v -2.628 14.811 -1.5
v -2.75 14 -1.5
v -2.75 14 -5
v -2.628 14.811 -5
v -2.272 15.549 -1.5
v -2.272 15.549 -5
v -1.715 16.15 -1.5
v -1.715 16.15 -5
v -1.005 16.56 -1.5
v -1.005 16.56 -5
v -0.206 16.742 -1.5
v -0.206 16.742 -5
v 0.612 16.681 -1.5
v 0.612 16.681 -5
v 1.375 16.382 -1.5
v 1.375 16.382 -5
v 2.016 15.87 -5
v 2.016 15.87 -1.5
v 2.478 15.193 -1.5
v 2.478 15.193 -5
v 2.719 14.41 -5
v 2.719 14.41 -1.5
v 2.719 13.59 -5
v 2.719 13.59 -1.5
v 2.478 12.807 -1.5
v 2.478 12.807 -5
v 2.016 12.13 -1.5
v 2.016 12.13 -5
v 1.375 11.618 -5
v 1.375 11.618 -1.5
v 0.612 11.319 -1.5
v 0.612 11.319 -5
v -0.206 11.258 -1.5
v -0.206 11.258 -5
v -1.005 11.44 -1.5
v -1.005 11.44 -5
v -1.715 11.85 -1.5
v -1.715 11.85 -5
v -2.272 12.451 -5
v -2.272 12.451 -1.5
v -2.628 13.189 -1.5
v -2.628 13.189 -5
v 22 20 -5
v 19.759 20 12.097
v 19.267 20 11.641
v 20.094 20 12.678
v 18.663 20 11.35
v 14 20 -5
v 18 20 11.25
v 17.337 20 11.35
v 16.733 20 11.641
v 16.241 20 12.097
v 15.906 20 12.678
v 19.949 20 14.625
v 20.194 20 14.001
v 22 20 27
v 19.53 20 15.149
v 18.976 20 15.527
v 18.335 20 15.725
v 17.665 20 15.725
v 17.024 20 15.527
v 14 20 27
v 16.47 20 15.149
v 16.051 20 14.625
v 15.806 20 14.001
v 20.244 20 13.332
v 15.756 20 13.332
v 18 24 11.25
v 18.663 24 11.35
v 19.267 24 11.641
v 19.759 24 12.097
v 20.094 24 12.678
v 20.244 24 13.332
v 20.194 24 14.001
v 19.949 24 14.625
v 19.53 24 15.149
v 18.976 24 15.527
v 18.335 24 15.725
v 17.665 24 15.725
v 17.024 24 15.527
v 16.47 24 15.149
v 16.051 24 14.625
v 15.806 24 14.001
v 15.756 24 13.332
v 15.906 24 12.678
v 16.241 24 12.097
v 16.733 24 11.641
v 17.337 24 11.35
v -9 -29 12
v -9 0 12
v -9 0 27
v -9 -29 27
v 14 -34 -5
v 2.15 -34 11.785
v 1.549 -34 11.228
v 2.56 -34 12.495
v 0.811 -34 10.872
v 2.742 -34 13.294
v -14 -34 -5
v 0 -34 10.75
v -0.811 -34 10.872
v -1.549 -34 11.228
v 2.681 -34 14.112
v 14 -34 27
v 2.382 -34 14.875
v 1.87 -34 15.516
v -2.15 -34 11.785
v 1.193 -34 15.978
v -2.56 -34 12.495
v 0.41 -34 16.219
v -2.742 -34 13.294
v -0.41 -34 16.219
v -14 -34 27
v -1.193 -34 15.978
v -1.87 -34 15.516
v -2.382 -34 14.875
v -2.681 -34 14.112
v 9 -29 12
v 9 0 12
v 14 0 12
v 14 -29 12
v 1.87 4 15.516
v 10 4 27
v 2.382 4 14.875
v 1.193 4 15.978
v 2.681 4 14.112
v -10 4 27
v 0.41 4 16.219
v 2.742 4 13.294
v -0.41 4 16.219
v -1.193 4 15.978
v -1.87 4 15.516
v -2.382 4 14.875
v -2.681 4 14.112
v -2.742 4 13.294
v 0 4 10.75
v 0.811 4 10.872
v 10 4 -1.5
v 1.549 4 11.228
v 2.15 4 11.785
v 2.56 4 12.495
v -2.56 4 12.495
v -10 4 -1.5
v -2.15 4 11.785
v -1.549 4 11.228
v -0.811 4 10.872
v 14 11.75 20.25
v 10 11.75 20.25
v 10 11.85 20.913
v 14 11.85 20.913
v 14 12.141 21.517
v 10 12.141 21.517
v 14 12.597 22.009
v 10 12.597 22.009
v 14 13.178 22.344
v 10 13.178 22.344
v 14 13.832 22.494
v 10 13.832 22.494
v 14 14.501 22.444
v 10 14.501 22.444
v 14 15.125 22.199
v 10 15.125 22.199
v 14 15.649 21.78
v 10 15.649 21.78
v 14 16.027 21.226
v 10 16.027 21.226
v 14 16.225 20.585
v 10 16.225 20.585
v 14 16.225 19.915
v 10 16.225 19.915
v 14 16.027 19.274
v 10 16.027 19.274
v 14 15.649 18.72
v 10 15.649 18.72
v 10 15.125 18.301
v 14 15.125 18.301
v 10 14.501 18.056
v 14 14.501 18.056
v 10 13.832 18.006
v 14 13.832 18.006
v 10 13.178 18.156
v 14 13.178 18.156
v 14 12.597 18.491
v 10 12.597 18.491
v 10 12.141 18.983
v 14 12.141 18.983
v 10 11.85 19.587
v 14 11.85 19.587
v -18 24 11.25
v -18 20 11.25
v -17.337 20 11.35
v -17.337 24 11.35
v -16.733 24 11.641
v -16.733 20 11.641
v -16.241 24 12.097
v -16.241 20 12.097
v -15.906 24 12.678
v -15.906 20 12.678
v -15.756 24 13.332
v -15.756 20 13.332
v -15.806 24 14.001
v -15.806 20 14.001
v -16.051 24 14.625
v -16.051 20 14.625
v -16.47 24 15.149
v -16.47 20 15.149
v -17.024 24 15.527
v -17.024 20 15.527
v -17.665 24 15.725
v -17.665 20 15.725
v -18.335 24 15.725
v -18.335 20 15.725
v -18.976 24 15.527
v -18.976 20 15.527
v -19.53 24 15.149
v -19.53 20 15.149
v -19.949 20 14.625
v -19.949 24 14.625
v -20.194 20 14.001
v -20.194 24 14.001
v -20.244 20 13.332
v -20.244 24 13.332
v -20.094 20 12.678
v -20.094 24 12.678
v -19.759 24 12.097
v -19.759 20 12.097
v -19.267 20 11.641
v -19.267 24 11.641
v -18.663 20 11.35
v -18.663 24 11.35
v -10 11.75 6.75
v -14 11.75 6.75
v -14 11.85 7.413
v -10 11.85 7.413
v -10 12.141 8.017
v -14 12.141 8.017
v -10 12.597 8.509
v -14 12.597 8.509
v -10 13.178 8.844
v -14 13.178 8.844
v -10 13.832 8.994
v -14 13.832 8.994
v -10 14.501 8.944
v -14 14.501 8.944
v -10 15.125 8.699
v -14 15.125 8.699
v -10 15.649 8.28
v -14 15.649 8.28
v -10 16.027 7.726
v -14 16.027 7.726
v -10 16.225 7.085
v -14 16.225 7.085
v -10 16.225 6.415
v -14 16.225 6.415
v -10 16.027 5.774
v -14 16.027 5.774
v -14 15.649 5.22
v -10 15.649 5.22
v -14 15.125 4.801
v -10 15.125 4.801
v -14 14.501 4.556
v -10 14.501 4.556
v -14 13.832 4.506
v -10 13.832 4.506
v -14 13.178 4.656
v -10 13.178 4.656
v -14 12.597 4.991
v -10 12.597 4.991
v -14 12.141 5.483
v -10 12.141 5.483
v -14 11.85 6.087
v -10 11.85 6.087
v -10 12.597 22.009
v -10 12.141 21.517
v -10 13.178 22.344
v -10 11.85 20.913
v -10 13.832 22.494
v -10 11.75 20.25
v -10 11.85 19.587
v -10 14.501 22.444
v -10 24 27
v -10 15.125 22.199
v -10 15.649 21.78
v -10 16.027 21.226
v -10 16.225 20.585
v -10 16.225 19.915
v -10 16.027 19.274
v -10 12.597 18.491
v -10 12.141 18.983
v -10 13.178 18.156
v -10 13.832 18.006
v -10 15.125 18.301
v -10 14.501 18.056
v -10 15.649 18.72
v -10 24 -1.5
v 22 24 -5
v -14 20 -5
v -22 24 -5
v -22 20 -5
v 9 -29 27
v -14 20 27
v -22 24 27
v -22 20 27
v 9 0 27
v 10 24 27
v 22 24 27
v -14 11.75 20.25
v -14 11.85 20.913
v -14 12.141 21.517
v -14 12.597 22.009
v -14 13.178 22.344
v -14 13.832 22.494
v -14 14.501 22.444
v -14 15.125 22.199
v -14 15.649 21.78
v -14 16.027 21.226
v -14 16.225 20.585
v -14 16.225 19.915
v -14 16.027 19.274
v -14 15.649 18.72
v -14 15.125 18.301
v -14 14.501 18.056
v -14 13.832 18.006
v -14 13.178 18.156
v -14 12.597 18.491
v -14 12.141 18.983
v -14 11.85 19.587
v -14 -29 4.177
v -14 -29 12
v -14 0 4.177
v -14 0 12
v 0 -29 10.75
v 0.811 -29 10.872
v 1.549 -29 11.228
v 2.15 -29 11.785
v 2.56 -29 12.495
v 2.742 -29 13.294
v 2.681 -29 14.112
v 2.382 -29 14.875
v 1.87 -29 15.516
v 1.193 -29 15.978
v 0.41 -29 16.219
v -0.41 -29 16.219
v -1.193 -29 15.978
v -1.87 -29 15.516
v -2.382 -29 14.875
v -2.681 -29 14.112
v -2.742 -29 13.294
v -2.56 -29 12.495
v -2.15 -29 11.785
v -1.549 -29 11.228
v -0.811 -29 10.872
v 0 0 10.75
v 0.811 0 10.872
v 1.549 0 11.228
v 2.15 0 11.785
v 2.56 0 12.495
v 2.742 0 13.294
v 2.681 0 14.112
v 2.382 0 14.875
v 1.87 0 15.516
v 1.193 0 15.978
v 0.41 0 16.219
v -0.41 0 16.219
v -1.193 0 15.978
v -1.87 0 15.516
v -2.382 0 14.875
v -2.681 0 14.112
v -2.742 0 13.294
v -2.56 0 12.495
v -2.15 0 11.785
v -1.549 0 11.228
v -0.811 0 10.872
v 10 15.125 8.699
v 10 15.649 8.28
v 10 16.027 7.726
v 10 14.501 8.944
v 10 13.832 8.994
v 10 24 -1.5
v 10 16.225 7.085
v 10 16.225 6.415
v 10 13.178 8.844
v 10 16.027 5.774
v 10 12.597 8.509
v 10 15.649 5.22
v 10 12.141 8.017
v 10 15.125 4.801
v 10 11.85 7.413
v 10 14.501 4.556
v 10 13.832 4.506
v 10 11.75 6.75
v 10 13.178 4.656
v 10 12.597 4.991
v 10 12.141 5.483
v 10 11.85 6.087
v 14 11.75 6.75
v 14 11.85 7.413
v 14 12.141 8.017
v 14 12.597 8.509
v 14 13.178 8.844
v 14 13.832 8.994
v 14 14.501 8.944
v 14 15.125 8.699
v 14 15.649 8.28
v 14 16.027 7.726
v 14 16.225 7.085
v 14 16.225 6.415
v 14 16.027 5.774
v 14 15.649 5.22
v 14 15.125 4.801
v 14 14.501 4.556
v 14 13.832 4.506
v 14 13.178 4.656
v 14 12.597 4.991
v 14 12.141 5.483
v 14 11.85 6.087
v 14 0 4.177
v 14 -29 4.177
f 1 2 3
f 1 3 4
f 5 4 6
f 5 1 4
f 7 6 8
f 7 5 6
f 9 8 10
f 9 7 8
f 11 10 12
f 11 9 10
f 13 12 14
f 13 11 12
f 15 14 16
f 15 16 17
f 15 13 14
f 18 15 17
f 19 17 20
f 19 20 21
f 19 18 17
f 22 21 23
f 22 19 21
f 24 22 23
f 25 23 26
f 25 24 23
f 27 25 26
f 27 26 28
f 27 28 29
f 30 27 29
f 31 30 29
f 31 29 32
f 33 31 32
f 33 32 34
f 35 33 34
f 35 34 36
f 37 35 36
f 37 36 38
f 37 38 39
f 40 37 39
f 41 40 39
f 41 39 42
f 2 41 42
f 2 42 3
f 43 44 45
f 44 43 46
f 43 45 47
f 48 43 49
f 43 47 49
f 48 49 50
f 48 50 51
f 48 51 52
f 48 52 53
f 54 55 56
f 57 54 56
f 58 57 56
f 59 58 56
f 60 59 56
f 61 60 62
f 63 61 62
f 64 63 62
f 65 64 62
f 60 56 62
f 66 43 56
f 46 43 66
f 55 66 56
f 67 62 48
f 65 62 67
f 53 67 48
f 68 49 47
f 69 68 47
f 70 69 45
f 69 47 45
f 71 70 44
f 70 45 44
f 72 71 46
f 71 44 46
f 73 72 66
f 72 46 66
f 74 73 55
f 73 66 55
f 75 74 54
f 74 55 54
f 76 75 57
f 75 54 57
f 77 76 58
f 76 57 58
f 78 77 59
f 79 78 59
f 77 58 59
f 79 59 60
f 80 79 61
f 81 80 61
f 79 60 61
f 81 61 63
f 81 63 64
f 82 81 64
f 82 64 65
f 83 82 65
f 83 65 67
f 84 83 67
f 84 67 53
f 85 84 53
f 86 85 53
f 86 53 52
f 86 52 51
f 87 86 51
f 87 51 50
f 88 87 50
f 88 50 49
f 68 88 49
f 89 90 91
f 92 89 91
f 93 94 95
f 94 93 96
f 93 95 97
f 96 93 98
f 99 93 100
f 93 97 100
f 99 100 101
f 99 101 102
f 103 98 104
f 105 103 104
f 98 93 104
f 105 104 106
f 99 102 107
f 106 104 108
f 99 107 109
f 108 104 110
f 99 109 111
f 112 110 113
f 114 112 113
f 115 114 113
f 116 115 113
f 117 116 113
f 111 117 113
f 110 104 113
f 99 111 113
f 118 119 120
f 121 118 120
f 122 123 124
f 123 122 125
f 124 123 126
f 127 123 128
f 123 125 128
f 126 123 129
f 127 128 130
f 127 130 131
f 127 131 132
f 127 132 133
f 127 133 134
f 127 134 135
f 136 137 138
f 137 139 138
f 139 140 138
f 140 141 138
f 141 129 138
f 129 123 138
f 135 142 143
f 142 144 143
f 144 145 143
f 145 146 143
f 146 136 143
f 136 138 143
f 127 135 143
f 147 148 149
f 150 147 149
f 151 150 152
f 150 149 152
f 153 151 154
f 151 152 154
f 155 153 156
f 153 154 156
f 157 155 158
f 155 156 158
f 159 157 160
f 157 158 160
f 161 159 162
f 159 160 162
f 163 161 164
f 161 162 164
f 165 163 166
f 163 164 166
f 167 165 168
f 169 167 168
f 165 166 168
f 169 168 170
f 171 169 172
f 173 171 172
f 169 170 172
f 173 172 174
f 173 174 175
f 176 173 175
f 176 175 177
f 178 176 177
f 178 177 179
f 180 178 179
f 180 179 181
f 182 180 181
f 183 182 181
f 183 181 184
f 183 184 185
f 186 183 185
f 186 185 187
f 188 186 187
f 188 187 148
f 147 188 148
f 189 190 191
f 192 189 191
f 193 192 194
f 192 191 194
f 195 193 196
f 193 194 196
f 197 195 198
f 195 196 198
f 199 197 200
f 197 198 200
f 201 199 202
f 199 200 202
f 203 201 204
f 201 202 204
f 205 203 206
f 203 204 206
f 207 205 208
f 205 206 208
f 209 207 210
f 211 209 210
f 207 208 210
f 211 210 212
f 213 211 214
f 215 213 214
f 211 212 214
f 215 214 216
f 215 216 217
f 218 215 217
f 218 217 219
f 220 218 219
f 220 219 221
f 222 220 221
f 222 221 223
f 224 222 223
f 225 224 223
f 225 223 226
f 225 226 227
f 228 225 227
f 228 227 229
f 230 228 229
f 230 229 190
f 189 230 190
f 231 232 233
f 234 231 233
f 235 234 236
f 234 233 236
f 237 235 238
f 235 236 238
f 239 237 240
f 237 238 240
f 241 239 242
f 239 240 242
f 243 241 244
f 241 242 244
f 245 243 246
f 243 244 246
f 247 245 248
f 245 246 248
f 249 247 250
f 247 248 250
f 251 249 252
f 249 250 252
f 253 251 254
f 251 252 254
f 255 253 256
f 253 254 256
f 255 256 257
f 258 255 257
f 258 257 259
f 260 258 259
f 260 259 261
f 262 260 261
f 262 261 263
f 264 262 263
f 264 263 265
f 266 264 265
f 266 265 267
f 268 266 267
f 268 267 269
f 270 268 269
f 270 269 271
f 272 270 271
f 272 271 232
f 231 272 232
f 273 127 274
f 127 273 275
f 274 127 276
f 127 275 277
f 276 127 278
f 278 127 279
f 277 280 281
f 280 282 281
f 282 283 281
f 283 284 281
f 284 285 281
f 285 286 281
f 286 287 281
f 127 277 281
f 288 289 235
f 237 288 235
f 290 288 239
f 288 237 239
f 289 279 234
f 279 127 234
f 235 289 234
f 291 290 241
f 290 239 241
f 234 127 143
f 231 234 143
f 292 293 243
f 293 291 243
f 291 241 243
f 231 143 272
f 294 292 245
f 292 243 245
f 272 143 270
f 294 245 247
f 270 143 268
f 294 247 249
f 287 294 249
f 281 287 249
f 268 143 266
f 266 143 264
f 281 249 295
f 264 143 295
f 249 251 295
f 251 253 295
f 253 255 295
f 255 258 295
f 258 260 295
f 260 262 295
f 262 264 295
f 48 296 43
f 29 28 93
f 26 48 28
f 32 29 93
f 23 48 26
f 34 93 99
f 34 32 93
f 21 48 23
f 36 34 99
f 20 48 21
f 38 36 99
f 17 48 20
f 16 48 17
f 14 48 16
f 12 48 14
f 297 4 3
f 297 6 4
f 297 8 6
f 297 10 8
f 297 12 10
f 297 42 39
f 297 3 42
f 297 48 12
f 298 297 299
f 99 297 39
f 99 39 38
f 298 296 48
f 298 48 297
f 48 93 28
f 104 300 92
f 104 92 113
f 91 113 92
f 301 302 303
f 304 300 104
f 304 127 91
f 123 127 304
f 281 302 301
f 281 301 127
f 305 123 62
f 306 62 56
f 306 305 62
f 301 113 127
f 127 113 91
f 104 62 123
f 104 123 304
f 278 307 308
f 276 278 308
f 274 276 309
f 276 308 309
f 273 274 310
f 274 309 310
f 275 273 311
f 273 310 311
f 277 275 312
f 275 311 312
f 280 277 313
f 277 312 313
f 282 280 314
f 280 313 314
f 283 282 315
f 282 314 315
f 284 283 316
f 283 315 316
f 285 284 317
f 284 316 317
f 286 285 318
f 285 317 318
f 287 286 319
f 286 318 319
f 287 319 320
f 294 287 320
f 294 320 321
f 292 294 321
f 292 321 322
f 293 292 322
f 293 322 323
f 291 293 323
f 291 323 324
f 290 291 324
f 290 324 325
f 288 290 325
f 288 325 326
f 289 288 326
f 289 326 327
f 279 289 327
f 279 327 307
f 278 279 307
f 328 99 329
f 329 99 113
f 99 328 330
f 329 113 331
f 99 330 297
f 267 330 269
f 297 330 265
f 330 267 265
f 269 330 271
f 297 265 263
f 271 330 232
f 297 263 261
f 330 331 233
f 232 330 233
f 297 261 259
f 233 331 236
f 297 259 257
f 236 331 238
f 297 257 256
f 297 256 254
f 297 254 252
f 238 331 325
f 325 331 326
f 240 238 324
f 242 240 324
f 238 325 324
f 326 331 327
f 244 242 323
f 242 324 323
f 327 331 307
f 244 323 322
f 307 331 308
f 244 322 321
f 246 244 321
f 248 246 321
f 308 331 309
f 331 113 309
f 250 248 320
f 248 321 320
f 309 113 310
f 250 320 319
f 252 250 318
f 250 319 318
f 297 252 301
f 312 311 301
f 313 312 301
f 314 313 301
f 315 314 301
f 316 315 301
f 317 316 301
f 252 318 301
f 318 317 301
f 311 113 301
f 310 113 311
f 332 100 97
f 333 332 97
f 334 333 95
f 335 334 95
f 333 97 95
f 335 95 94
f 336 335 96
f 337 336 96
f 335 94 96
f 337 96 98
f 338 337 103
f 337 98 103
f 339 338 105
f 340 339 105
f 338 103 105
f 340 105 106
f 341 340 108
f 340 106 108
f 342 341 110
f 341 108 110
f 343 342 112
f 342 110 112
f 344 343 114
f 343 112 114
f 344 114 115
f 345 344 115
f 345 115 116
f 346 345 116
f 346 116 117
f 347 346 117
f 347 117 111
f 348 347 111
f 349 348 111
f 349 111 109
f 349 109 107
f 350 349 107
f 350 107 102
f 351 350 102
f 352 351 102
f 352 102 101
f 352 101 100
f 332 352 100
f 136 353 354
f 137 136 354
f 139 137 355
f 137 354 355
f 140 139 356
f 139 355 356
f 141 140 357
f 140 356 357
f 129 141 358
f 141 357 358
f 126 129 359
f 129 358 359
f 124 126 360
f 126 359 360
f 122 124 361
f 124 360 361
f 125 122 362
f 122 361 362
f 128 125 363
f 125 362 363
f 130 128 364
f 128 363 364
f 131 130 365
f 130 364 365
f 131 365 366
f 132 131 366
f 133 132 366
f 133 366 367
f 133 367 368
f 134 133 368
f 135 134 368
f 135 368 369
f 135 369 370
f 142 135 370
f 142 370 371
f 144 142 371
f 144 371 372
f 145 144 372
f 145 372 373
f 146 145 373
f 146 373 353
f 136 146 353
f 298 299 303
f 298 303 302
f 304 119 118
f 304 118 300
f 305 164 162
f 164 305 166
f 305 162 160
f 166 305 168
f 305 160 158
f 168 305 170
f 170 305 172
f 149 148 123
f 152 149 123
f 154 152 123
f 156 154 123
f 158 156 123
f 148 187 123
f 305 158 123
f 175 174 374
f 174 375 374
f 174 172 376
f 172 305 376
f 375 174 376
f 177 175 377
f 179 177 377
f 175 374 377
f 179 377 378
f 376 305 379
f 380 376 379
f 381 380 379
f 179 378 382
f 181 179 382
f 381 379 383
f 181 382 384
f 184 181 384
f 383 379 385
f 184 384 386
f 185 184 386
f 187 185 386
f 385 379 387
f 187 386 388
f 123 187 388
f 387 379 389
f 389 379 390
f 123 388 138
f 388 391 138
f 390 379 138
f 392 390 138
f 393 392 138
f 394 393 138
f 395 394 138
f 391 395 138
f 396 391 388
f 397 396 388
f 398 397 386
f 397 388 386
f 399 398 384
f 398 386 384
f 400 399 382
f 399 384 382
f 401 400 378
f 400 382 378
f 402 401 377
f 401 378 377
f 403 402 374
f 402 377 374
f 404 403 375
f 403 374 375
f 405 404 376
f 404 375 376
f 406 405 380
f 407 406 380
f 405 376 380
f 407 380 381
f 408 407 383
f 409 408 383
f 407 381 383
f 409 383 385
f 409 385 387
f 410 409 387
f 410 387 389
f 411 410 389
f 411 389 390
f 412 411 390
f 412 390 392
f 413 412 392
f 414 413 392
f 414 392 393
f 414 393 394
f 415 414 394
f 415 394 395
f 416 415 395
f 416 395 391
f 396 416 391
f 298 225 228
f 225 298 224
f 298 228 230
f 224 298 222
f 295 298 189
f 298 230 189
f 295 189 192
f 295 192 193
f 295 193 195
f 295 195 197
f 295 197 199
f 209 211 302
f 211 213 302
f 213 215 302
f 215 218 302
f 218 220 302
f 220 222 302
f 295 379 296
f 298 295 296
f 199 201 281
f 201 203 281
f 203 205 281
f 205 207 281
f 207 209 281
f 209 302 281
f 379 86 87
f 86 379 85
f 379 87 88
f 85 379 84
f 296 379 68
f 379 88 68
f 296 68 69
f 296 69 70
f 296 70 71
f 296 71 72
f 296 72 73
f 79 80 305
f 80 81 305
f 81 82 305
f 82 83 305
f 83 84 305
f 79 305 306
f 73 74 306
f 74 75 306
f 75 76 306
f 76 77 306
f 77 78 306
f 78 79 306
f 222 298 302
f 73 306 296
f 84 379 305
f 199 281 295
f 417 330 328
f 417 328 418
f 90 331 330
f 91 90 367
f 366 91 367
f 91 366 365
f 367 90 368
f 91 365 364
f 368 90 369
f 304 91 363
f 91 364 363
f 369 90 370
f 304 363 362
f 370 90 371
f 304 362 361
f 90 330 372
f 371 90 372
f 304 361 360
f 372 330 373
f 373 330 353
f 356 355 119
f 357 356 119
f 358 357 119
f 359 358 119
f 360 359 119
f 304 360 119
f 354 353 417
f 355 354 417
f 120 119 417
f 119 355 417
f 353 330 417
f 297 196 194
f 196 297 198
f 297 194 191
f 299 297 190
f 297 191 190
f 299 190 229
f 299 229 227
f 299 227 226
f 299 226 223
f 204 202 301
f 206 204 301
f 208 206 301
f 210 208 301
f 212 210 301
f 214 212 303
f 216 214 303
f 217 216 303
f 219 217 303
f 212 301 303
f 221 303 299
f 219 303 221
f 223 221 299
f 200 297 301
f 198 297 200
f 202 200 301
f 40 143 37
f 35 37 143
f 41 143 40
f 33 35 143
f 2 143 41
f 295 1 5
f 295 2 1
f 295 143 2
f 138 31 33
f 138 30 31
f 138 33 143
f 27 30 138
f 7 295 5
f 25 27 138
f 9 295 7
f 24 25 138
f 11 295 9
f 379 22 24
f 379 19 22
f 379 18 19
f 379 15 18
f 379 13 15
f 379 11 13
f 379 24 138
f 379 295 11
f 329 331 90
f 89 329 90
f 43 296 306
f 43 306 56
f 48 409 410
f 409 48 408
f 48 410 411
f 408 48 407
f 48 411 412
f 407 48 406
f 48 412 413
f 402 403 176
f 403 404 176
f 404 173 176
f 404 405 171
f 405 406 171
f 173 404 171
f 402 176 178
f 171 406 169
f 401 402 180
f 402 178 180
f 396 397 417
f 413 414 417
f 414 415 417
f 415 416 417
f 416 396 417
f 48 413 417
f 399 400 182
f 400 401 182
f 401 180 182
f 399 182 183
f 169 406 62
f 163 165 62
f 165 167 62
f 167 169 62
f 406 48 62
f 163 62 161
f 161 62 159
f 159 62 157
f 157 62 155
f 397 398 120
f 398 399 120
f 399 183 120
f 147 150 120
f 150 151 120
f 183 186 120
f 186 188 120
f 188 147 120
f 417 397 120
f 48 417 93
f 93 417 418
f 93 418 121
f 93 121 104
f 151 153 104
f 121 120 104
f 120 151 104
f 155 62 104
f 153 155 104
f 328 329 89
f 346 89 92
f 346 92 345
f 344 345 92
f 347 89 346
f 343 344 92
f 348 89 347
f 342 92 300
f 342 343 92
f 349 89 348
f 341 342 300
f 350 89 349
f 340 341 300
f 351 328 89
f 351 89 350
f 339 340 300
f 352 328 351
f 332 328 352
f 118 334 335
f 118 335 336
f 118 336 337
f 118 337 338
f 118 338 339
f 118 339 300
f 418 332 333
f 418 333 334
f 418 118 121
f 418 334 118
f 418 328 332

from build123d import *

# Parameters (mm, degrees)
BOSS_EXTRUDE1_DEPTH = 27
SKETCH2_R           = 2.25
CUT_EXTRUDE1_DEPTH  = 52
SKETCH3_R           = 2.25
CUT_EXTRUDE2_DEPTH  = 41.162171256
SKETCH5_W           = 28
SKETCH5_H           = 4.176671075
BOSS_EXTRUDE2_DEPTH = 34
SKETCH6_W           = 28
SKETCH6_H           = 5
BOSS_EXTRUDE3_DEPTH = 22.823328925
SKETCH7_R           = 2.75
CUT_EXTRUDE3_DEPTH  = 68.653529103
BOSS_EXTRUDE4_REACH = 50.672
SKETCH8_W           = 5
SKETCH8_H           = 15
SKETCH9_R           = 2.75
BOSS_EXTRUDE5_DEPTH = 5
SKETCH10_W          = 20
SKETCH10_H          = 20
CUT_EXTRUDE4_DEPTH  = 1.5


with BuildPart() as part:
    # Sketch1 → Boss-Extrude1 (new body)
    with BuildSketch(Plane.XY):
        Polygon((-14, 0), (14, 0), (14, 20), (22, 20), (22, 24), (10, 24), (10, 4), (-10, 4), (-10, 24), (-22, 24), (-22, 20), (-14, 20), align=None)
    extrude(amount=BOSS_EXTRUDE1_DEPTH)

    # Sketch2 → Cut-Extrude1 (cut, through all)
    with BuildSketch(Plane.ZY.offset(14)):
        with Locations(Location((6.75, 14, 0), (0, 0, 270))):
            Circle(SKETCH2_R)
        with Locations(Location((20.25, 14, 0), (0, 0, 270))):
            Circle(SKETCH2_R)
    extrude(amount=-CUT_EXTRUDE1_DEPTH, mode=Mode.SUBTRACT)

    # Sketch3 → Cut-Extrude2 (cut, through all)
    with BuildSketch(Plane.XZ.offset(-20)):
        with Locations(Location((-18, 13.5, 0), (0, 0, 270))):
            Circle(SKETCH3_R)
        with Locations(Location((18, 13.5, 0), (0, 0, 270))):
            Circle(SKETCH3_R)
    extrude(amount=-CUT_EXTRUDE2_DEPTH, mode=Mode.SUBTRACT)

    # Sketch5 → Boss-Extrude2 (add)
    with BuildSketch(Plane.XZ):
        with Locations((0, 2.088335538)):
            Rectangle(SKETCH5_W, SKETCH5_H)
    extrude(amount=BOSS_EXTRUDE2_DEPTH)

    # Sketch6 → Boss-Extrude3 (add)
    with BuildSketch(Plane.XY.offset(4.176671075)):
        with Locations((0, -31.5)):
            Rectangle(SKETCH6_W, SKETCH6_H)
    extrude(amount=BOSS_EXTRUDE3_DEPTH)

    # Sketch7 → Cut-Extrude3 (cut, through all)
    with BuildSketch(Plane.XZ.offset(34)):
        with Locations(Location((0, 13.5, 0), (0, 0, 270))):
            Circle(SKETCH7_R)
    extrude(amount=-CUT_EXTRUDE3_DEPTH, mode=Mode.SUBTRACT)

    # Sketch8 → Boss-Extrude4 (add, up to next)
    with BuildSketch(Plane.XZ, mode=Mode.PRIVATE) as boss_extrude4_sk1:
        with Locations((11.5, 19.5)):
            Rectangle(SKETCH8_W, SKETCH8_H)
    boss_extrude4_tool1 = extrude(boss_extrude4_sk1.sketch, amount=BOSS_EXTRUDE4_REACH, mode=Mode.PRIVATE) - part.part
    # Sketch8 → Boss-Extrude4 (add, up to next)
    with BuildSketch(Plane.XZ, mode=Mode.PRIVATE) as boss_extrude4_sk2:
        with Locations((-11.5, 19.5)):
            Rectangle(SKETCH8_W, SKETCH8_H)
    boss_extrude4_tool2 = extrude(boss_extrude4_sk2.sketch, amount=BOSS_EXTRUDE4_REACH, mode=Mode.PRIVATE) - part.part
    add(boss_extrude4_tool1.solids().sort_by_distance((11.5, 0, 19.5))[0])
    add(boss_extrude4_tool2.solids().sort_by_distance((-11.5, 0, 19.5))[0])

    # Sketch9 → Boss-Extrude5 (add)
    with BuildSketch(Plane(origin=(0, 0, 0), x_dir=(-1, 0, 0), z_dir=(0, 0, -1))):
        Polygon((-14, -34), (14, -34), (14, 20), (22, 20), (22, 24), (-22, 24), (-22, 20), (-14, 20), align=None)
        with Locations((0, 14)):
            Circle(SKETCH9_R, mode=Mode.SUBTRACT)
    extrude(amount=BOSS_EXTRUDE5_DEPTH)

    # Sketch10 → Cut-Extrude4 (cut)
    with BuildSketch(Plane.XY):
        with Locations((0, 14)):
            Rectangle(SKETCH10_W, SKETCH10_H)
    extrude(amount=-CUT_EXTRUDE4_DEPTH, mode=Mode.SUBTRACT)


solid = part.part
